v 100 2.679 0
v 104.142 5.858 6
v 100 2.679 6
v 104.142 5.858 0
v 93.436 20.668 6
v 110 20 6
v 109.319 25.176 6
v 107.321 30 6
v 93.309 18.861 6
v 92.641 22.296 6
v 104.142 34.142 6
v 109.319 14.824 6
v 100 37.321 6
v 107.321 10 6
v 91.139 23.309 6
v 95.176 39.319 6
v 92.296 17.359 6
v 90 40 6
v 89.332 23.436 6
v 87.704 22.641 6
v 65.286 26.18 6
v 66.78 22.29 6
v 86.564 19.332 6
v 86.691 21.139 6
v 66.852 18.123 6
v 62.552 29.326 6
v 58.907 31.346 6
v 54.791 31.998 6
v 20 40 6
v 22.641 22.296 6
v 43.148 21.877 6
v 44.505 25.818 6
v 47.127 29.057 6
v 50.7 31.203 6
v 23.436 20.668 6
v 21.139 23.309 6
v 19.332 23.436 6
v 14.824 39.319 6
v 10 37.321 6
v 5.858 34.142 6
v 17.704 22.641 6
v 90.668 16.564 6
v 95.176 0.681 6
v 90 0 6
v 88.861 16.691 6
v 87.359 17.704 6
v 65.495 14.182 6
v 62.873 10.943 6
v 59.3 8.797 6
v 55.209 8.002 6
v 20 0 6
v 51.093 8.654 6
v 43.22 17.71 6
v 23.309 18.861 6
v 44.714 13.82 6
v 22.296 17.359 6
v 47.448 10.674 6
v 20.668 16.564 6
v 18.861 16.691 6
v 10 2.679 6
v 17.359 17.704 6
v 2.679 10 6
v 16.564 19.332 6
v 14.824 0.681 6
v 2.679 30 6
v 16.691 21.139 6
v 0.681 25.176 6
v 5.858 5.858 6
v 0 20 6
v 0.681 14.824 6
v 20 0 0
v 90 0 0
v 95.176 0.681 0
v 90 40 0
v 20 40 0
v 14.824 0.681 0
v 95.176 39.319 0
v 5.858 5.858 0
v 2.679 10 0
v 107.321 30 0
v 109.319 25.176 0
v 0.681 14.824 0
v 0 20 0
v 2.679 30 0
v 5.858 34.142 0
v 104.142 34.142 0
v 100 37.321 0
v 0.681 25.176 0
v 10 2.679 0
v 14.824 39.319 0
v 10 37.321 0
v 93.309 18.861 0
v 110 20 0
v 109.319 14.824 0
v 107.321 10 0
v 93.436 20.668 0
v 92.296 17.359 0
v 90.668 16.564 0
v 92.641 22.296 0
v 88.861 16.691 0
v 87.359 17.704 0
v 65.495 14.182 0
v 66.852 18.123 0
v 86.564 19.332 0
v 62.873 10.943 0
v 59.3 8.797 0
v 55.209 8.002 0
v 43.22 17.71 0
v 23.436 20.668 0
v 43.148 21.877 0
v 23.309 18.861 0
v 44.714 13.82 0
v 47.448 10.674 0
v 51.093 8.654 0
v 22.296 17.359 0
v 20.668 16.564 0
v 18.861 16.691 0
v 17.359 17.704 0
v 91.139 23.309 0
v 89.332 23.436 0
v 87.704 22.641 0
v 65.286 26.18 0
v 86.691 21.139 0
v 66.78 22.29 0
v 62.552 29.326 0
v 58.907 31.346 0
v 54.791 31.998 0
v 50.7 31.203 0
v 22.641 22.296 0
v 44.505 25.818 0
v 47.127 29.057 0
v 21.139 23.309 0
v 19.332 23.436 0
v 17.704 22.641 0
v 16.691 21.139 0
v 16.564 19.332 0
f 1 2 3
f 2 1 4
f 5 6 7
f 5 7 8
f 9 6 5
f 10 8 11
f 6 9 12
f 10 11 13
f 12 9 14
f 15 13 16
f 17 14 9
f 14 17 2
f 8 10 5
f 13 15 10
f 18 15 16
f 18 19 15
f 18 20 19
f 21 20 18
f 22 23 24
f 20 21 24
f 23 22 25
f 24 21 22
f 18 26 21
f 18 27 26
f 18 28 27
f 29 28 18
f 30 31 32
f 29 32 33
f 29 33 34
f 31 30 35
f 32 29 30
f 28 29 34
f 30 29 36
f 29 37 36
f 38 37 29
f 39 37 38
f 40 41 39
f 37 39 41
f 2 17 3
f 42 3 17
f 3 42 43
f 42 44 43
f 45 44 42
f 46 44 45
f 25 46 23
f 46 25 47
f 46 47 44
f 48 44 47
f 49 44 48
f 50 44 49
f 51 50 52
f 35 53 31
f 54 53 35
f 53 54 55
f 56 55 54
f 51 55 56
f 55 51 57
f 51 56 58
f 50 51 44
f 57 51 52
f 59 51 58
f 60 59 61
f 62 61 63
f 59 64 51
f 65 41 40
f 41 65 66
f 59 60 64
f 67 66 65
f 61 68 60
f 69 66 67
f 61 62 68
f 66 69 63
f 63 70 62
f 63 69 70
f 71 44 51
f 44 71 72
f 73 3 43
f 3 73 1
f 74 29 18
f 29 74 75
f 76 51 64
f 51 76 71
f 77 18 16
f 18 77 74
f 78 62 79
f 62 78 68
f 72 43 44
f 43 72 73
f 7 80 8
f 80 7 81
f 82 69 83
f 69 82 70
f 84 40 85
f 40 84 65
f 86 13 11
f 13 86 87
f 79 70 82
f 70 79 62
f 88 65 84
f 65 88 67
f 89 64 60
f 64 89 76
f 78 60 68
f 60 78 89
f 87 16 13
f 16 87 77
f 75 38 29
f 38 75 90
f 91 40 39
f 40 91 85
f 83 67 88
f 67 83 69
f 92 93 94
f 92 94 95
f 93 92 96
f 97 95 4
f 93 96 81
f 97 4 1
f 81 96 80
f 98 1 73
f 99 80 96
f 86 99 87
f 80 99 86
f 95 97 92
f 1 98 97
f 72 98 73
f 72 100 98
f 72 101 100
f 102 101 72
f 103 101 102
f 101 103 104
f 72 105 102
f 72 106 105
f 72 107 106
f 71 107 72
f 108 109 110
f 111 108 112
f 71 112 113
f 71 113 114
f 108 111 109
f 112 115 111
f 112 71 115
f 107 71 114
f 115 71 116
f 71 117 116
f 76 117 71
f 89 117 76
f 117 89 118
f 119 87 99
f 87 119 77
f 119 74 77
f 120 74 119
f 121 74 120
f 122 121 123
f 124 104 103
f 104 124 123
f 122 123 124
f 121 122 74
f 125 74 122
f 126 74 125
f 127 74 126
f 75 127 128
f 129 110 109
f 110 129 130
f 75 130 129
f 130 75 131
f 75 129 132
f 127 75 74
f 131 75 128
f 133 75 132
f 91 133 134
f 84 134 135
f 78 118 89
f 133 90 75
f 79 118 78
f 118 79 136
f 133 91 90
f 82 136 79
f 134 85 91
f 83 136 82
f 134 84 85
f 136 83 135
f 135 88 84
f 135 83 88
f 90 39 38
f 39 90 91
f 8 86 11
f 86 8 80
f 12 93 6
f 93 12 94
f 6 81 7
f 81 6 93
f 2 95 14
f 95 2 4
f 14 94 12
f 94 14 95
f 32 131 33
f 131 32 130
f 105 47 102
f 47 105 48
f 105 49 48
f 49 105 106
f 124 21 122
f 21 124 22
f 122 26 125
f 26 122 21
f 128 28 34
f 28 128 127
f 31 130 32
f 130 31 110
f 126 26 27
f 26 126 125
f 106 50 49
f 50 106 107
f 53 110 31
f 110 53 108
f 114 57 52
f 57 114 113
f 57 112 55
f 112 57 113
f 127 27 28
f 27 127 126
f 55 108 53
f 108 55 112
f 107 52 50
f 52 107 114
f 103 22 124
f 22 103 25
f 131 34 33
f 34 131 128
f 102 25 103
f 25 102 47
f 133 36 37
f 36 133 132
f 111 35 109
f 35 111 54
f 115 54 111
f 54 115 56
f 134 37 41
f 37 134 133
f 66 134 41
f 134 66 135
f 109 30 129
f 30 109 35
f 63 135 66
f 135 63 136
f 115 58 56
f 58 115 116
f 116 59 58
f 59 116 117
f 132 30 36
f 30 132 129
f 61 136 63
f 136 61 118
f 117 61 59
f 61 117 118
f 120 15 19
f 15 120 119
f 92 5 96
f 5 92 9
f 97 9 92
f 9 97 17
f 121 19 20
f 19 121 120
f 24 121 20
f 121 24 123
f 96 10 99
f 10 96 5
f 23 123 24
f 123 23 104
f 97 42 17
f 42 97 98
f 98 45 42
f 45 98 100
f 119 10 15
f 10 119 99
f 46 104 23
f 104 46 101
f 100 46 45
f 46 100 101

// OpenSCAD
$fn = 32;

// ----------------------------------------------------------------------
// Spacer plate: obround span 70, caps R20
// ----------------------------------------------------------------------

// --- parameters (mm) ---
bore_r = 12;              // centre bore radius
bolt_r = 3.5;             // bolt hole radius
plate_t = 6;              // plate thickness, Z (extrusion height)
span = 70;                // obround span
cap_r = 20;               // cap radius

profile = [[20, 40], [14.824, 39.319], [10, 37.321], [5.858, 34.142], [2.679, 30], [0.681, 25.176], [0, 20], [0.681, 14.824], [2.679, 10], [5.858, 5.858], [10, 2.679], [14.824, 0.681], [20, 0], [90, 0], [95.176, 0.681], [100, 2.679], [104.142, 5.858], [107.321, 10], [109.319, 14.824], [110, 20], [109.319, 25.176], [107.321, 30], [104.142, 34.142], [100, 37.321], [95.176, 39.319], [90, 40]];  // primary outline, 26 points, counter clockwise
void_1 = [[66.78, 22.29], [65.286, 26.18], [62.552, 29.326], [58.907, 31.346], [54.791, 31.998], [50.7, 31.203], [47.127, 29.057], [44.505, 25.818], [43.148, 21.877], [43.22, 17.71], [44.714, 13.82], [47.448, 10.674], [51.093, 8.654], [55.209, 8.002], [59.3, 8.797], [62.873, 10.943], [65.495, 14.182], [66.852, 18.123]];  // centre bore, 18 points
void_2 = [[23.436, 20.668], [22.641, 22.296], [21.139, 23.309], [19.332, 23.436], [17.704, 22.641], [16.691, 21.139], [16.564, 19.332], [17.359, 17.704], [18.861, 16.691], [20.668, 16.564], [22.296, 17.359], [23.309, 18.861]];  // end hole, 12 points
void_3 = [[93.436, 20.668], [92.641, 22.296], [91.139, 23.309], [89.332, 23.436], [87.704, 22.641], [86.691, 21.139], [86.564, 19.332], [87.359, 17.704], [88.861, 16.691], [90.668, 16.564], [92.296, 17.359], [93.309, 18.861]];  // end hole, 12 points

// --- the one profile operation ---
difference() {
  linear_extrude(height = plate_t) polygon(points = profile);
  translate([0, 0, -1])
    linear_extrude(height = plate_t + 2) polygon(points = void_1);
  translate([0, 0, -1])
    linear_extrude(height = plate_t + 2) polygon(points = void_2);
  translate([0, 0, -1])
    linear_extrude(height = plate_t + 2) polygon(points = void_3);
}
